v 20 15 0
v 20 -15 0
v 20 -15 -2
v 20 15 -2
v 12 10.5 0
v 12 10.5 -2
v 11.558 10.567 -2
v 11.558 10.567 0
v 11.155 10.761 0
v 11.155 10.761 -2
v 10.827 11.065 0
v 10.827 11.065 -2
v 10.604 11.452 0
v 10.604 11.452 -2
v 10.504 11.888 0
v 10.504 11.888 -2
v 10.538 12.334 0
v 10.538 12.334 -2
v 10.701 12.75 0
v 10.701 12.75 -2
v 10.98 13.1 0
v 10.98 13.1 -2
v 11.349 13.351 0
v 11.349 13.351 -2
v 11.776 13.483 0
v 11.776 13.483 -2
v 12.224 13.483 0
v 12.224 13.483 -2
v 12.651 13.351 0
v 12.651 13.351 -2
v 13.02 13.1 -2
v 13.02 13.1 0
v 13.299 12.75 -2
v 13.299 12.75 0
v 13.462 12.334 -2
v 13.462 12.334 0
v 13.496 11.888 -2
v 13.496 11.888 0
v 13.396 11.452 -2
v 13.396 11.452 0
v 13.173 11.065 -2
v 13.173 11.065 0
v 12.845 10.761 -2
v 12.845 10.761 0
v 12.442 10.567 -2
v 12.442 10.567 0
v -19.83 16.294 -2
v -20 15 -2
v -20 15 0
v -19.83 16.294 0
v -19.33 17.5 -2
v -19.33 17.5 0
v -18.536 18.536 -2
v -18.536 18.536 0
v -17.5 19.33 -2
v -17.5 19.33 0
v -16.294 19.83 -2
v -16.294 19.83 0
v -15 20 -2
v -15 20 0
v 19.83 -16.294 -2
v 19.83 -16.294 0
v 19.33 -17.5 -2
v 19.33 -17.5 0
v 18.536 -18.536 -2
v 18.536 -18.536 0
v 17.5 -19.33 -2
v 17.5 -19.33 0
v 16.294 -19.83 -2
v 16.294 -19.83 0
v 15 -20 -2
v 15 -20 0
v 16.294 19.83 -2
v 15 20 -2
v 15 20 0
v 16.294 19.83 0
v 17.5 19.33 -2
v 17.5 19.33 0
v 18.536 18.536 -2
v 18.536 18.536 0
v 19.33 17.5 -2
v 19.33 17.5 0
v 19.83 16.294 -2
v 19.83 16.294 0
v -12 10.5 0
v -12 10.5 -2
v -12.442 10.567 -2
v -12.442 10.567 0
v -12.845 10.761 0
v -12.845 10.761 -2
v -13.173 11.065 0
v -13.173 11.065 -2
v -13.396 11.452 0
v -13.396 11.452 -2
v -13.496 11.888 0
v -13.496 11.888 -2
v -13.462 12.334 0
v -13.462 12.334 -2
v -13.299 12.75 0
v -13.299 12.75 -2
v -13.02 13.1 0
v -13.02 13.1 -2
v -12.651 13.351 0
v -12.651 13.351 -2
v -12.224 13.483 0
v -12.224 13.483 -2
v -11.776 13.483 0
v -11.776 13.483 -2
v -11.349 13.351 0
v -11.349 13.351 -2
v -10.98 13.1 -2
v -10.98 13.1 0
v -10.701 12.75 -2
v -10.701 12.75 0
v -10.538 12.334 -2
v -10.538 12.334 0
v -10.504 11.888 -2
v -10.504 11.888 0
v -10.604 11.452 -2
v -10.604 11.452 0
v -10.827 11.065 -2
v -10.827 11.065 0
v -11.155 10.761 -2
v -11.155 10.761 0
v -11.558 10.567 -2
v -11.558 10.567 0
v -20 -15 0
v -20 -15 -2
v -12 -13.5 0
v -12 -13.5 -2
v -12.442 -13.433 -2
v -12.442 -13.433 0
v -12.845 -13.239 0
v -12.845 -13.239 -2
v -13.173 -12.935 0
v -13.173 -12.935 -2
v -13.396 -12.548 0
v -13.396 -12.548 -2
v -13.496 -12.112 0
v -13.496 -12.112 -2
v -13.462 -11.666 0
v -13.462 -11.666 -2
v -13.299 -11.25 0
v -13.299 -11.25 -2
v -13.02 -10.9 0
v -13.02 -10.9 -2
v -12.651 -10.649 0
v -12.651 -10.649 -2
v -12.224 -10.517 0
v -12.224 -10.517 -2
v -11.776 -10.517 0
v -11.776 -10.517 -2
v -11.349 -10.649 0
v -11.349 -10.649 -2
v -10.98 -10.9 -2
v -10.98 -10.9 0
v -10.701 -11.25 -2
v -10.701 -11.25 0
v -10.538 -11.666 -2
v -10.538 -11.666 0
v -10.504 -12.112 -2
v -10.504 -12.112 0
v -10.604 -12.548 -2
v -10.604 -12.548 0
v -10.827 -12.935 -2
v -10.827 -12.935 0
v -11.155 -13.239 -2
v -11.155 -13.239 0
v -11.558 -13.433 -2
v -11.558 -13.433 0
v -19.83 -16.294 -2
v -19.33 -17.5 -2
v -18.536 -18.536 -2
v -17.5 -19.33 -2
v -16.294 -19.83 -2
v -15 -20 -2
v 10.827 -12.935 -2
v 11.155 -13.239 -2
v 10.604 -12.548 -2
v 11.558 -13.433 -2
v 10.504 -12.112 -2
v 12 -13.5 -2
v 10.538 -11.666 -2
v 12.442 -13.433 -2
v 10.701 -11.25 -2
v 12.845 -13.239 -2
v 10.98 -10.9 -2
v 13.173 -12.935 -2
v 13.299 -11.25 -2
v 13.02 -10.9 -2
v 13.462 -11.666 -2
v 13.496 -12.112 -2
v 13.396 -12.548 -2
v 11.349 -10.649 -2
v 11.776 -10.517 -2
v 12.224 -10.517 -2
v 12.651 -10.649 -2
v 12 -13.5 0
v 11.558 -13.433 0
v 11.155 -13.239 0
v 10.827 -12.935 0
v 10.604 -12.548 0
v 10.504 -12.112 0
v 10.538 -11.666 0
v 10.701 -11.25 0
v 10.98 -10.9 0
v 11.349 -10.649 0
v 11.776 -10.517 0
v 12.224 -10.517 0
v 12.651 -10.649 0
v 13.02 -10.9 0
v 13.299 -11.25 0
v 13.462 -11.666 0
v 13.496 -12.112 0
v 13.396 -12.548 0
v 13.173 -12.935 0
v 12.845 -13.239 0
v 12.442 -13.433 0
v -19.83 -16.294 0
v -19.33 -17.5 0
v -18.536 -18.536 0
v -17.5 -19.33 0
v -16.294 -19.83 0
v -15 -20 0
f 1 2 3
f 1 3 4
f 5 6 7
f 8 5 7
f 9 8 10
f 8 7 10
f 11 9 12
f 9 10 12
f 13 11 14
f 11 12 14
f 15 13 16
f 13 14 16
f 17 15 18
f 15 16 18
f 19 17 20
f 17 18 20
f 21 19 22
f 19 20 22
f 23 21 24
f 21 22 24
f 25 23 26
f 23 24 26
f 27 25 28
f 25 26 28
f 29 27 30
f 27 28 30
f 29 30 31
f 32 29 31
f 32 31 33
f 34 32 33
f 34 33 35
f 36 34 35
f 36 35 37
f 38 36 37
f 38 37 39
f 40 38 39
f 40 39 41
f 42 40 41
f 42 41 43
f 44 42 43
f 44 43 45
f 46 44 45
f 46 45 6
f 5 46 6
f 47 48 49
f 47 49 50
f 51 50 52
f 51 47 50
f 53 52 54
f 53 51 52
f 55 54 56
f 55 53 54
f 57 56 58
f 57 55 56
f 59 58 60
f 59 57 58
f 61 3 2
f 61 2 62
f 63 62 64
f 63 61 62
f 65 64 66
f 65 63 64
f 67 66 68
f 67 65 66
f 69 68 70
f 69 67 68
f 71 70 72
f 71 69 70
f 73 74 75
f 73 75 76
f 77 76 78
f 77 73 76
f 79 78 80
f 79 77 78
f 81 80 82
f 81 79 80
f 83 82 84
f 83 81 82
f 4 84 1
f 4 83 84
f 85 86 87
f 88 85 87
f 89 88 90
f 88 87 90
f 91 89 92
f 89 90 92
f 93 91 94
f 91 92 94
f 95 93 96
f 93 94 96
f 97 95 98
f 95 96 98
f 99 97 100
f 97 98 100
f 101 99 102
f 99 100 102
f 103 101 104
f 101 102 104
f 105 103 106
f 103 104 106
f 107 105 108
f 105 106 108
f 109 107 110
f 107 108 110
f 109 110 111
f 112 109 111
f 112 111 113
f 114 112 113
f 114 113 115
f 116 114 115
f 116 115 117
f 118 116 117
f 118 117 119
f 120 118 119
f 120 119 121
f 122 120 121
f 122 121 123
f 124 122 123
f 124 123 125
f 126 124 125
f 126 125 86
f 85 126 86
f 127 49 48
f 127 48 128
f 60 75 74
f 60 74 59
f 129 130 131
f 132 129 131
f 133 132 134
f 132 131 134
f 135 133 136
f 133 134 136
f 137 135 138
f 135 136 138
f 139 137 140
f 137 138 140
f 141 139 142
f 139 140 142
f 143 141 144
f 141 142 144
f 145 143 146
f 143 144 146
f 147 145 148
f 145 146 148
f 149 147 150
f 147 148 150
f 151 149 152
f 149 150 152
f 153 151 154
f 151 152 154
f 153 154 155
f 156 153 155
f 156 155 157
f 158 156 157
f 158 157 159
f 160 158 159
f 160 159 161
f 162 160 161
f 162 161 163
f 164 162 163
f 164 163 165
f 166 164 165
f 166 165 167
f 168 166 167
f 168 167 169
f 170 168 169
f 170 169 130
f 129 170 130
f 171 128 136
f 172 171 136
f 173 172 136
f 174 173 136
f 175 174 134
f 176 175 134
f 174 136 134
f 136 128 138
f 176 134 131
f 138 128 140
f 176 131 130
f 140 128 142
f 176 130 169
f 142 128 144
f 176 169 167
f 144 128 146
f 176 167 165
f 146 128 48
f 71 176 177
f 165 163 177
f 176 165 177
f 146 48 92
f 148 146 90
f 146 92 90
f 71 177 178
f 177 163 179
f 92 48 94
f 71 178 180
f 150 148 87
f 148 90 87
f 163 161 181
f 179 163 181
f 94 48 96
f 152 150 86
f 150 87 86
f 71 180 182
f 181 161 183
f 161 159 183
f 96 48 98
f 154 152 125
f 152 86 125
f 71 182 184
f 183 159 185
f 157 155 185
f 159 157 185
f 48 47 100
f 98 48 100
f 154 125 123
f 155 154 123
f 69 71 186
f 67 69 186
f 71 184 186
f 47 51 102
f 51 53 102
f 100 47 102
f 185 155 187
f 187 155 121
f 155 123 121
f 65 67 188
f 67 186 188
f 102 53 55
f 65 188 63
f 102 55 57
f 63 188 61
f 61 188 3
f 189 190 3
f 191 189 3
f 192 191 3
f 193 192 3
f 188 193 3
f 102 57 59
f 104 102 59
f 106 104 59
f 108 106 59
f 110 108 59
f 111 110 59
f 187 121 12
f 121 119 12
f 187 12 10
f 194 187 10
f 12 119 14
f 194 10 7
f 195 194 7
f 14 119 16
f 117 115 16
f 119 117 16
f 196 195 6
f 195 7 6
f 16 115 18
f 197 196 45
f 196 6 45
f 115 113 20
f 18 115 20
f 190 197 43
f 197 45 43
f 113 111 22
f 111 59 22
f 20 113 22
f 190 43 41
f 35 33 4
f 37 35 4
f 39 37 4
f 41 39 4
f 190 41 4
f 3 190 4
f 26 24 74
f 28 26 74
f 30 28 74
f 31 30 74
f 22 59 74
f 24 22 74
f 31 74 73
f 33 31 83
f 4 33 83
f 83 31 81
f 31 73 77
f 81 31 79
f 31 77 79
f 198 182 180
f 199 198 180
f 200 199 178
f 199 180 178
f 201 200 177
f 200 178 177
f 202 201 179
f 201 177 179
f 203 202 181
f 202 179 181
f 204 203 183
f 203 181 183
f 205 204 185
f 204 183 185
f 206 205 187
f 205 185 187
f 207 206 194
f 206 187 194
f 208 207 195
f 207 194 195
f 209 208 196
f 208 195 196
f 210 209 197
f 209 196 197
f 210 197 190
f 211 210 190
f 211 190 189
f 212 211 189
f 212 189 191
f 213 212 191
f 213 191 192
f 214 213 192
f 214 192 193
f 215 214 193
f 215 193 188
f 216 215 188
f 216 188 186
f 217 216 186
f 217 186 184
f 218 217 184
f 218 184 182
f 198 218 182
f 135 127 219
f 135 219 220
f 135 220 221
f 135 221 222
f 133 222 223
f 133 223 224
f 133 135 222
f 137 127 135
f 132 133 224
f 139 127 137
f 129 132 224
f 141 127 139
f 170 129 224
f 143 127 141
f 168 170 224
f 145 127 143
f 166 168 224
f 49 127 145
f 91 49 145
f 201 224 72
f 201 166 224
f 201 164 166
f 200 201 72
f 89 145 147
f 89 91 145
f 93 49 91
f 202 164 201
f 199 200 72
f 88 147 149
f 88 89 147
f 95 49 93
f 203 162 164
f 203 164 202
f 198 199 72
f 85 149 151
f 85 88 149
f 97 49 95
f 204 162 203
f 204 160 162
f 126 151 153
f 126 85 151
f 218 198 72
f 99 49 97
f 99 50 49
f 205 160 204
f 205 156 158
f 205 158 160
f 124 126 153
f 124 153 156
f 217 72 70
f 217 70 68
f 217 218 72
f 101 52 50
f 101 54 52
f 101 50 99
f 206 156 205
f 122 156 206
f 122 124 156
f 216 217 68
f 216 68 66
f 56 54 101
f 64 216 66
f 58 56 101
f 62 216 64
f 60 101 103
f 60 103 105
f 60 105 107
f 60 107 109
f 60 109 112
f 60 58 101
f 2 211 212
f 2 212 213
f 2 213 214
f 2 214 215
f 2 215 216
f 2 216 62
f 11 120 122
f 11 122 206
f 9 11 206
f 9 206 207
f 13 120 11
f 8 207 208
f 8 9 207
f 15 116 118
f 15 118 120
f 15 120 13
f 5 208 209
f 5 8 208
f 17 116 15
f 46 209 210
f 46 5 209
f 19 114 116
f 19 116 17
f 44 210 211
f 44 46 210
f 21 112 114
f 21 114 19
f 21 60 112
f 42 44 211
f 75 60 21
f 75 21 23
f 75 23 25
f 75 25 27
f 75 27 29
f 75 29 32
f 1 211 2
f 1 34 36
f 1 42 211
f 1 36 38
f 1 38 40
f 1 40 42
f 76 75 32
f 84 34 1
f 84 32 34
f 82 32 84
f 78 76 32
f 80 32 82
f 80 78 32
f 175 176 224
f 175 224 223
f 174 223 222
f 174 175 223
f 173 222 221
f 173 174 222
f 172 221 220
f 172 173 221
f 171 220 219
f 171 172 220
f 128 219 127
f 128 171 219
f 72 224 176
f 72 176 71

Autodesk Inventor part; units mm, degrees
ref_plane "YZ Plane" through (0, 0, 0) normal (1, 0, 0) x (0, 1, 0)
ref_plane "XZ Plane" through (0, 0, 0) normal (0, 1, 0) x (-1, 0, 0)
ref_plane "XY Plane" through (0, 0, 0) normal (0, 0, 1) x (1, 0, 0)
sketch "Sketch1" plane through (0, 0, 0) normal (0, 0, 1) x (1, 0, 0)
  line L0 (-20, -20) -> (20, -20)
  line L1 (20, -20) -> (20, 20)
  line L2 (20, 20) -> (-20, 20)
  line L3 (-20, 20) -> (-20, -20)
  line L4 (-20, -20) -> (20, 20) construction
  line L5 (20, -20) -> (-20, 20) construction
  line L6 (-12, -12) -> (12, -12) construction
  line L7 (12, -12) -> (12, 12) construction
  line L8 (12, 12) -> (-12, 12) construction
  line L9 (-12, 12) -> (-12, -12) construction
  line L10 (-12, -12) -> (12, 12) construction
  line L11 (12, -12) -> (-12, 12) construction
  point P0 (0, 0)
  dimension "d0" = 40
  dimension "d1" = 40
  dimension "d2" = 24
  dimension "d3" = 24
extrude "Extrusion1" add sketch "Sketch1" against normal blind 2
hole "Hole1" at (-12, 12, 0) at (12, 12, 0) at (12, -12, 0) at (-12, -12, 0) direction (0, 0, -1) diameter 3 depth 2
fillet "Fillet1" radius 5 4 edges at (20, 20, -1) (20, -20, -1) (-20, -20, -1) (-20, 20, -1)
properties part number "26" material "Gold"
